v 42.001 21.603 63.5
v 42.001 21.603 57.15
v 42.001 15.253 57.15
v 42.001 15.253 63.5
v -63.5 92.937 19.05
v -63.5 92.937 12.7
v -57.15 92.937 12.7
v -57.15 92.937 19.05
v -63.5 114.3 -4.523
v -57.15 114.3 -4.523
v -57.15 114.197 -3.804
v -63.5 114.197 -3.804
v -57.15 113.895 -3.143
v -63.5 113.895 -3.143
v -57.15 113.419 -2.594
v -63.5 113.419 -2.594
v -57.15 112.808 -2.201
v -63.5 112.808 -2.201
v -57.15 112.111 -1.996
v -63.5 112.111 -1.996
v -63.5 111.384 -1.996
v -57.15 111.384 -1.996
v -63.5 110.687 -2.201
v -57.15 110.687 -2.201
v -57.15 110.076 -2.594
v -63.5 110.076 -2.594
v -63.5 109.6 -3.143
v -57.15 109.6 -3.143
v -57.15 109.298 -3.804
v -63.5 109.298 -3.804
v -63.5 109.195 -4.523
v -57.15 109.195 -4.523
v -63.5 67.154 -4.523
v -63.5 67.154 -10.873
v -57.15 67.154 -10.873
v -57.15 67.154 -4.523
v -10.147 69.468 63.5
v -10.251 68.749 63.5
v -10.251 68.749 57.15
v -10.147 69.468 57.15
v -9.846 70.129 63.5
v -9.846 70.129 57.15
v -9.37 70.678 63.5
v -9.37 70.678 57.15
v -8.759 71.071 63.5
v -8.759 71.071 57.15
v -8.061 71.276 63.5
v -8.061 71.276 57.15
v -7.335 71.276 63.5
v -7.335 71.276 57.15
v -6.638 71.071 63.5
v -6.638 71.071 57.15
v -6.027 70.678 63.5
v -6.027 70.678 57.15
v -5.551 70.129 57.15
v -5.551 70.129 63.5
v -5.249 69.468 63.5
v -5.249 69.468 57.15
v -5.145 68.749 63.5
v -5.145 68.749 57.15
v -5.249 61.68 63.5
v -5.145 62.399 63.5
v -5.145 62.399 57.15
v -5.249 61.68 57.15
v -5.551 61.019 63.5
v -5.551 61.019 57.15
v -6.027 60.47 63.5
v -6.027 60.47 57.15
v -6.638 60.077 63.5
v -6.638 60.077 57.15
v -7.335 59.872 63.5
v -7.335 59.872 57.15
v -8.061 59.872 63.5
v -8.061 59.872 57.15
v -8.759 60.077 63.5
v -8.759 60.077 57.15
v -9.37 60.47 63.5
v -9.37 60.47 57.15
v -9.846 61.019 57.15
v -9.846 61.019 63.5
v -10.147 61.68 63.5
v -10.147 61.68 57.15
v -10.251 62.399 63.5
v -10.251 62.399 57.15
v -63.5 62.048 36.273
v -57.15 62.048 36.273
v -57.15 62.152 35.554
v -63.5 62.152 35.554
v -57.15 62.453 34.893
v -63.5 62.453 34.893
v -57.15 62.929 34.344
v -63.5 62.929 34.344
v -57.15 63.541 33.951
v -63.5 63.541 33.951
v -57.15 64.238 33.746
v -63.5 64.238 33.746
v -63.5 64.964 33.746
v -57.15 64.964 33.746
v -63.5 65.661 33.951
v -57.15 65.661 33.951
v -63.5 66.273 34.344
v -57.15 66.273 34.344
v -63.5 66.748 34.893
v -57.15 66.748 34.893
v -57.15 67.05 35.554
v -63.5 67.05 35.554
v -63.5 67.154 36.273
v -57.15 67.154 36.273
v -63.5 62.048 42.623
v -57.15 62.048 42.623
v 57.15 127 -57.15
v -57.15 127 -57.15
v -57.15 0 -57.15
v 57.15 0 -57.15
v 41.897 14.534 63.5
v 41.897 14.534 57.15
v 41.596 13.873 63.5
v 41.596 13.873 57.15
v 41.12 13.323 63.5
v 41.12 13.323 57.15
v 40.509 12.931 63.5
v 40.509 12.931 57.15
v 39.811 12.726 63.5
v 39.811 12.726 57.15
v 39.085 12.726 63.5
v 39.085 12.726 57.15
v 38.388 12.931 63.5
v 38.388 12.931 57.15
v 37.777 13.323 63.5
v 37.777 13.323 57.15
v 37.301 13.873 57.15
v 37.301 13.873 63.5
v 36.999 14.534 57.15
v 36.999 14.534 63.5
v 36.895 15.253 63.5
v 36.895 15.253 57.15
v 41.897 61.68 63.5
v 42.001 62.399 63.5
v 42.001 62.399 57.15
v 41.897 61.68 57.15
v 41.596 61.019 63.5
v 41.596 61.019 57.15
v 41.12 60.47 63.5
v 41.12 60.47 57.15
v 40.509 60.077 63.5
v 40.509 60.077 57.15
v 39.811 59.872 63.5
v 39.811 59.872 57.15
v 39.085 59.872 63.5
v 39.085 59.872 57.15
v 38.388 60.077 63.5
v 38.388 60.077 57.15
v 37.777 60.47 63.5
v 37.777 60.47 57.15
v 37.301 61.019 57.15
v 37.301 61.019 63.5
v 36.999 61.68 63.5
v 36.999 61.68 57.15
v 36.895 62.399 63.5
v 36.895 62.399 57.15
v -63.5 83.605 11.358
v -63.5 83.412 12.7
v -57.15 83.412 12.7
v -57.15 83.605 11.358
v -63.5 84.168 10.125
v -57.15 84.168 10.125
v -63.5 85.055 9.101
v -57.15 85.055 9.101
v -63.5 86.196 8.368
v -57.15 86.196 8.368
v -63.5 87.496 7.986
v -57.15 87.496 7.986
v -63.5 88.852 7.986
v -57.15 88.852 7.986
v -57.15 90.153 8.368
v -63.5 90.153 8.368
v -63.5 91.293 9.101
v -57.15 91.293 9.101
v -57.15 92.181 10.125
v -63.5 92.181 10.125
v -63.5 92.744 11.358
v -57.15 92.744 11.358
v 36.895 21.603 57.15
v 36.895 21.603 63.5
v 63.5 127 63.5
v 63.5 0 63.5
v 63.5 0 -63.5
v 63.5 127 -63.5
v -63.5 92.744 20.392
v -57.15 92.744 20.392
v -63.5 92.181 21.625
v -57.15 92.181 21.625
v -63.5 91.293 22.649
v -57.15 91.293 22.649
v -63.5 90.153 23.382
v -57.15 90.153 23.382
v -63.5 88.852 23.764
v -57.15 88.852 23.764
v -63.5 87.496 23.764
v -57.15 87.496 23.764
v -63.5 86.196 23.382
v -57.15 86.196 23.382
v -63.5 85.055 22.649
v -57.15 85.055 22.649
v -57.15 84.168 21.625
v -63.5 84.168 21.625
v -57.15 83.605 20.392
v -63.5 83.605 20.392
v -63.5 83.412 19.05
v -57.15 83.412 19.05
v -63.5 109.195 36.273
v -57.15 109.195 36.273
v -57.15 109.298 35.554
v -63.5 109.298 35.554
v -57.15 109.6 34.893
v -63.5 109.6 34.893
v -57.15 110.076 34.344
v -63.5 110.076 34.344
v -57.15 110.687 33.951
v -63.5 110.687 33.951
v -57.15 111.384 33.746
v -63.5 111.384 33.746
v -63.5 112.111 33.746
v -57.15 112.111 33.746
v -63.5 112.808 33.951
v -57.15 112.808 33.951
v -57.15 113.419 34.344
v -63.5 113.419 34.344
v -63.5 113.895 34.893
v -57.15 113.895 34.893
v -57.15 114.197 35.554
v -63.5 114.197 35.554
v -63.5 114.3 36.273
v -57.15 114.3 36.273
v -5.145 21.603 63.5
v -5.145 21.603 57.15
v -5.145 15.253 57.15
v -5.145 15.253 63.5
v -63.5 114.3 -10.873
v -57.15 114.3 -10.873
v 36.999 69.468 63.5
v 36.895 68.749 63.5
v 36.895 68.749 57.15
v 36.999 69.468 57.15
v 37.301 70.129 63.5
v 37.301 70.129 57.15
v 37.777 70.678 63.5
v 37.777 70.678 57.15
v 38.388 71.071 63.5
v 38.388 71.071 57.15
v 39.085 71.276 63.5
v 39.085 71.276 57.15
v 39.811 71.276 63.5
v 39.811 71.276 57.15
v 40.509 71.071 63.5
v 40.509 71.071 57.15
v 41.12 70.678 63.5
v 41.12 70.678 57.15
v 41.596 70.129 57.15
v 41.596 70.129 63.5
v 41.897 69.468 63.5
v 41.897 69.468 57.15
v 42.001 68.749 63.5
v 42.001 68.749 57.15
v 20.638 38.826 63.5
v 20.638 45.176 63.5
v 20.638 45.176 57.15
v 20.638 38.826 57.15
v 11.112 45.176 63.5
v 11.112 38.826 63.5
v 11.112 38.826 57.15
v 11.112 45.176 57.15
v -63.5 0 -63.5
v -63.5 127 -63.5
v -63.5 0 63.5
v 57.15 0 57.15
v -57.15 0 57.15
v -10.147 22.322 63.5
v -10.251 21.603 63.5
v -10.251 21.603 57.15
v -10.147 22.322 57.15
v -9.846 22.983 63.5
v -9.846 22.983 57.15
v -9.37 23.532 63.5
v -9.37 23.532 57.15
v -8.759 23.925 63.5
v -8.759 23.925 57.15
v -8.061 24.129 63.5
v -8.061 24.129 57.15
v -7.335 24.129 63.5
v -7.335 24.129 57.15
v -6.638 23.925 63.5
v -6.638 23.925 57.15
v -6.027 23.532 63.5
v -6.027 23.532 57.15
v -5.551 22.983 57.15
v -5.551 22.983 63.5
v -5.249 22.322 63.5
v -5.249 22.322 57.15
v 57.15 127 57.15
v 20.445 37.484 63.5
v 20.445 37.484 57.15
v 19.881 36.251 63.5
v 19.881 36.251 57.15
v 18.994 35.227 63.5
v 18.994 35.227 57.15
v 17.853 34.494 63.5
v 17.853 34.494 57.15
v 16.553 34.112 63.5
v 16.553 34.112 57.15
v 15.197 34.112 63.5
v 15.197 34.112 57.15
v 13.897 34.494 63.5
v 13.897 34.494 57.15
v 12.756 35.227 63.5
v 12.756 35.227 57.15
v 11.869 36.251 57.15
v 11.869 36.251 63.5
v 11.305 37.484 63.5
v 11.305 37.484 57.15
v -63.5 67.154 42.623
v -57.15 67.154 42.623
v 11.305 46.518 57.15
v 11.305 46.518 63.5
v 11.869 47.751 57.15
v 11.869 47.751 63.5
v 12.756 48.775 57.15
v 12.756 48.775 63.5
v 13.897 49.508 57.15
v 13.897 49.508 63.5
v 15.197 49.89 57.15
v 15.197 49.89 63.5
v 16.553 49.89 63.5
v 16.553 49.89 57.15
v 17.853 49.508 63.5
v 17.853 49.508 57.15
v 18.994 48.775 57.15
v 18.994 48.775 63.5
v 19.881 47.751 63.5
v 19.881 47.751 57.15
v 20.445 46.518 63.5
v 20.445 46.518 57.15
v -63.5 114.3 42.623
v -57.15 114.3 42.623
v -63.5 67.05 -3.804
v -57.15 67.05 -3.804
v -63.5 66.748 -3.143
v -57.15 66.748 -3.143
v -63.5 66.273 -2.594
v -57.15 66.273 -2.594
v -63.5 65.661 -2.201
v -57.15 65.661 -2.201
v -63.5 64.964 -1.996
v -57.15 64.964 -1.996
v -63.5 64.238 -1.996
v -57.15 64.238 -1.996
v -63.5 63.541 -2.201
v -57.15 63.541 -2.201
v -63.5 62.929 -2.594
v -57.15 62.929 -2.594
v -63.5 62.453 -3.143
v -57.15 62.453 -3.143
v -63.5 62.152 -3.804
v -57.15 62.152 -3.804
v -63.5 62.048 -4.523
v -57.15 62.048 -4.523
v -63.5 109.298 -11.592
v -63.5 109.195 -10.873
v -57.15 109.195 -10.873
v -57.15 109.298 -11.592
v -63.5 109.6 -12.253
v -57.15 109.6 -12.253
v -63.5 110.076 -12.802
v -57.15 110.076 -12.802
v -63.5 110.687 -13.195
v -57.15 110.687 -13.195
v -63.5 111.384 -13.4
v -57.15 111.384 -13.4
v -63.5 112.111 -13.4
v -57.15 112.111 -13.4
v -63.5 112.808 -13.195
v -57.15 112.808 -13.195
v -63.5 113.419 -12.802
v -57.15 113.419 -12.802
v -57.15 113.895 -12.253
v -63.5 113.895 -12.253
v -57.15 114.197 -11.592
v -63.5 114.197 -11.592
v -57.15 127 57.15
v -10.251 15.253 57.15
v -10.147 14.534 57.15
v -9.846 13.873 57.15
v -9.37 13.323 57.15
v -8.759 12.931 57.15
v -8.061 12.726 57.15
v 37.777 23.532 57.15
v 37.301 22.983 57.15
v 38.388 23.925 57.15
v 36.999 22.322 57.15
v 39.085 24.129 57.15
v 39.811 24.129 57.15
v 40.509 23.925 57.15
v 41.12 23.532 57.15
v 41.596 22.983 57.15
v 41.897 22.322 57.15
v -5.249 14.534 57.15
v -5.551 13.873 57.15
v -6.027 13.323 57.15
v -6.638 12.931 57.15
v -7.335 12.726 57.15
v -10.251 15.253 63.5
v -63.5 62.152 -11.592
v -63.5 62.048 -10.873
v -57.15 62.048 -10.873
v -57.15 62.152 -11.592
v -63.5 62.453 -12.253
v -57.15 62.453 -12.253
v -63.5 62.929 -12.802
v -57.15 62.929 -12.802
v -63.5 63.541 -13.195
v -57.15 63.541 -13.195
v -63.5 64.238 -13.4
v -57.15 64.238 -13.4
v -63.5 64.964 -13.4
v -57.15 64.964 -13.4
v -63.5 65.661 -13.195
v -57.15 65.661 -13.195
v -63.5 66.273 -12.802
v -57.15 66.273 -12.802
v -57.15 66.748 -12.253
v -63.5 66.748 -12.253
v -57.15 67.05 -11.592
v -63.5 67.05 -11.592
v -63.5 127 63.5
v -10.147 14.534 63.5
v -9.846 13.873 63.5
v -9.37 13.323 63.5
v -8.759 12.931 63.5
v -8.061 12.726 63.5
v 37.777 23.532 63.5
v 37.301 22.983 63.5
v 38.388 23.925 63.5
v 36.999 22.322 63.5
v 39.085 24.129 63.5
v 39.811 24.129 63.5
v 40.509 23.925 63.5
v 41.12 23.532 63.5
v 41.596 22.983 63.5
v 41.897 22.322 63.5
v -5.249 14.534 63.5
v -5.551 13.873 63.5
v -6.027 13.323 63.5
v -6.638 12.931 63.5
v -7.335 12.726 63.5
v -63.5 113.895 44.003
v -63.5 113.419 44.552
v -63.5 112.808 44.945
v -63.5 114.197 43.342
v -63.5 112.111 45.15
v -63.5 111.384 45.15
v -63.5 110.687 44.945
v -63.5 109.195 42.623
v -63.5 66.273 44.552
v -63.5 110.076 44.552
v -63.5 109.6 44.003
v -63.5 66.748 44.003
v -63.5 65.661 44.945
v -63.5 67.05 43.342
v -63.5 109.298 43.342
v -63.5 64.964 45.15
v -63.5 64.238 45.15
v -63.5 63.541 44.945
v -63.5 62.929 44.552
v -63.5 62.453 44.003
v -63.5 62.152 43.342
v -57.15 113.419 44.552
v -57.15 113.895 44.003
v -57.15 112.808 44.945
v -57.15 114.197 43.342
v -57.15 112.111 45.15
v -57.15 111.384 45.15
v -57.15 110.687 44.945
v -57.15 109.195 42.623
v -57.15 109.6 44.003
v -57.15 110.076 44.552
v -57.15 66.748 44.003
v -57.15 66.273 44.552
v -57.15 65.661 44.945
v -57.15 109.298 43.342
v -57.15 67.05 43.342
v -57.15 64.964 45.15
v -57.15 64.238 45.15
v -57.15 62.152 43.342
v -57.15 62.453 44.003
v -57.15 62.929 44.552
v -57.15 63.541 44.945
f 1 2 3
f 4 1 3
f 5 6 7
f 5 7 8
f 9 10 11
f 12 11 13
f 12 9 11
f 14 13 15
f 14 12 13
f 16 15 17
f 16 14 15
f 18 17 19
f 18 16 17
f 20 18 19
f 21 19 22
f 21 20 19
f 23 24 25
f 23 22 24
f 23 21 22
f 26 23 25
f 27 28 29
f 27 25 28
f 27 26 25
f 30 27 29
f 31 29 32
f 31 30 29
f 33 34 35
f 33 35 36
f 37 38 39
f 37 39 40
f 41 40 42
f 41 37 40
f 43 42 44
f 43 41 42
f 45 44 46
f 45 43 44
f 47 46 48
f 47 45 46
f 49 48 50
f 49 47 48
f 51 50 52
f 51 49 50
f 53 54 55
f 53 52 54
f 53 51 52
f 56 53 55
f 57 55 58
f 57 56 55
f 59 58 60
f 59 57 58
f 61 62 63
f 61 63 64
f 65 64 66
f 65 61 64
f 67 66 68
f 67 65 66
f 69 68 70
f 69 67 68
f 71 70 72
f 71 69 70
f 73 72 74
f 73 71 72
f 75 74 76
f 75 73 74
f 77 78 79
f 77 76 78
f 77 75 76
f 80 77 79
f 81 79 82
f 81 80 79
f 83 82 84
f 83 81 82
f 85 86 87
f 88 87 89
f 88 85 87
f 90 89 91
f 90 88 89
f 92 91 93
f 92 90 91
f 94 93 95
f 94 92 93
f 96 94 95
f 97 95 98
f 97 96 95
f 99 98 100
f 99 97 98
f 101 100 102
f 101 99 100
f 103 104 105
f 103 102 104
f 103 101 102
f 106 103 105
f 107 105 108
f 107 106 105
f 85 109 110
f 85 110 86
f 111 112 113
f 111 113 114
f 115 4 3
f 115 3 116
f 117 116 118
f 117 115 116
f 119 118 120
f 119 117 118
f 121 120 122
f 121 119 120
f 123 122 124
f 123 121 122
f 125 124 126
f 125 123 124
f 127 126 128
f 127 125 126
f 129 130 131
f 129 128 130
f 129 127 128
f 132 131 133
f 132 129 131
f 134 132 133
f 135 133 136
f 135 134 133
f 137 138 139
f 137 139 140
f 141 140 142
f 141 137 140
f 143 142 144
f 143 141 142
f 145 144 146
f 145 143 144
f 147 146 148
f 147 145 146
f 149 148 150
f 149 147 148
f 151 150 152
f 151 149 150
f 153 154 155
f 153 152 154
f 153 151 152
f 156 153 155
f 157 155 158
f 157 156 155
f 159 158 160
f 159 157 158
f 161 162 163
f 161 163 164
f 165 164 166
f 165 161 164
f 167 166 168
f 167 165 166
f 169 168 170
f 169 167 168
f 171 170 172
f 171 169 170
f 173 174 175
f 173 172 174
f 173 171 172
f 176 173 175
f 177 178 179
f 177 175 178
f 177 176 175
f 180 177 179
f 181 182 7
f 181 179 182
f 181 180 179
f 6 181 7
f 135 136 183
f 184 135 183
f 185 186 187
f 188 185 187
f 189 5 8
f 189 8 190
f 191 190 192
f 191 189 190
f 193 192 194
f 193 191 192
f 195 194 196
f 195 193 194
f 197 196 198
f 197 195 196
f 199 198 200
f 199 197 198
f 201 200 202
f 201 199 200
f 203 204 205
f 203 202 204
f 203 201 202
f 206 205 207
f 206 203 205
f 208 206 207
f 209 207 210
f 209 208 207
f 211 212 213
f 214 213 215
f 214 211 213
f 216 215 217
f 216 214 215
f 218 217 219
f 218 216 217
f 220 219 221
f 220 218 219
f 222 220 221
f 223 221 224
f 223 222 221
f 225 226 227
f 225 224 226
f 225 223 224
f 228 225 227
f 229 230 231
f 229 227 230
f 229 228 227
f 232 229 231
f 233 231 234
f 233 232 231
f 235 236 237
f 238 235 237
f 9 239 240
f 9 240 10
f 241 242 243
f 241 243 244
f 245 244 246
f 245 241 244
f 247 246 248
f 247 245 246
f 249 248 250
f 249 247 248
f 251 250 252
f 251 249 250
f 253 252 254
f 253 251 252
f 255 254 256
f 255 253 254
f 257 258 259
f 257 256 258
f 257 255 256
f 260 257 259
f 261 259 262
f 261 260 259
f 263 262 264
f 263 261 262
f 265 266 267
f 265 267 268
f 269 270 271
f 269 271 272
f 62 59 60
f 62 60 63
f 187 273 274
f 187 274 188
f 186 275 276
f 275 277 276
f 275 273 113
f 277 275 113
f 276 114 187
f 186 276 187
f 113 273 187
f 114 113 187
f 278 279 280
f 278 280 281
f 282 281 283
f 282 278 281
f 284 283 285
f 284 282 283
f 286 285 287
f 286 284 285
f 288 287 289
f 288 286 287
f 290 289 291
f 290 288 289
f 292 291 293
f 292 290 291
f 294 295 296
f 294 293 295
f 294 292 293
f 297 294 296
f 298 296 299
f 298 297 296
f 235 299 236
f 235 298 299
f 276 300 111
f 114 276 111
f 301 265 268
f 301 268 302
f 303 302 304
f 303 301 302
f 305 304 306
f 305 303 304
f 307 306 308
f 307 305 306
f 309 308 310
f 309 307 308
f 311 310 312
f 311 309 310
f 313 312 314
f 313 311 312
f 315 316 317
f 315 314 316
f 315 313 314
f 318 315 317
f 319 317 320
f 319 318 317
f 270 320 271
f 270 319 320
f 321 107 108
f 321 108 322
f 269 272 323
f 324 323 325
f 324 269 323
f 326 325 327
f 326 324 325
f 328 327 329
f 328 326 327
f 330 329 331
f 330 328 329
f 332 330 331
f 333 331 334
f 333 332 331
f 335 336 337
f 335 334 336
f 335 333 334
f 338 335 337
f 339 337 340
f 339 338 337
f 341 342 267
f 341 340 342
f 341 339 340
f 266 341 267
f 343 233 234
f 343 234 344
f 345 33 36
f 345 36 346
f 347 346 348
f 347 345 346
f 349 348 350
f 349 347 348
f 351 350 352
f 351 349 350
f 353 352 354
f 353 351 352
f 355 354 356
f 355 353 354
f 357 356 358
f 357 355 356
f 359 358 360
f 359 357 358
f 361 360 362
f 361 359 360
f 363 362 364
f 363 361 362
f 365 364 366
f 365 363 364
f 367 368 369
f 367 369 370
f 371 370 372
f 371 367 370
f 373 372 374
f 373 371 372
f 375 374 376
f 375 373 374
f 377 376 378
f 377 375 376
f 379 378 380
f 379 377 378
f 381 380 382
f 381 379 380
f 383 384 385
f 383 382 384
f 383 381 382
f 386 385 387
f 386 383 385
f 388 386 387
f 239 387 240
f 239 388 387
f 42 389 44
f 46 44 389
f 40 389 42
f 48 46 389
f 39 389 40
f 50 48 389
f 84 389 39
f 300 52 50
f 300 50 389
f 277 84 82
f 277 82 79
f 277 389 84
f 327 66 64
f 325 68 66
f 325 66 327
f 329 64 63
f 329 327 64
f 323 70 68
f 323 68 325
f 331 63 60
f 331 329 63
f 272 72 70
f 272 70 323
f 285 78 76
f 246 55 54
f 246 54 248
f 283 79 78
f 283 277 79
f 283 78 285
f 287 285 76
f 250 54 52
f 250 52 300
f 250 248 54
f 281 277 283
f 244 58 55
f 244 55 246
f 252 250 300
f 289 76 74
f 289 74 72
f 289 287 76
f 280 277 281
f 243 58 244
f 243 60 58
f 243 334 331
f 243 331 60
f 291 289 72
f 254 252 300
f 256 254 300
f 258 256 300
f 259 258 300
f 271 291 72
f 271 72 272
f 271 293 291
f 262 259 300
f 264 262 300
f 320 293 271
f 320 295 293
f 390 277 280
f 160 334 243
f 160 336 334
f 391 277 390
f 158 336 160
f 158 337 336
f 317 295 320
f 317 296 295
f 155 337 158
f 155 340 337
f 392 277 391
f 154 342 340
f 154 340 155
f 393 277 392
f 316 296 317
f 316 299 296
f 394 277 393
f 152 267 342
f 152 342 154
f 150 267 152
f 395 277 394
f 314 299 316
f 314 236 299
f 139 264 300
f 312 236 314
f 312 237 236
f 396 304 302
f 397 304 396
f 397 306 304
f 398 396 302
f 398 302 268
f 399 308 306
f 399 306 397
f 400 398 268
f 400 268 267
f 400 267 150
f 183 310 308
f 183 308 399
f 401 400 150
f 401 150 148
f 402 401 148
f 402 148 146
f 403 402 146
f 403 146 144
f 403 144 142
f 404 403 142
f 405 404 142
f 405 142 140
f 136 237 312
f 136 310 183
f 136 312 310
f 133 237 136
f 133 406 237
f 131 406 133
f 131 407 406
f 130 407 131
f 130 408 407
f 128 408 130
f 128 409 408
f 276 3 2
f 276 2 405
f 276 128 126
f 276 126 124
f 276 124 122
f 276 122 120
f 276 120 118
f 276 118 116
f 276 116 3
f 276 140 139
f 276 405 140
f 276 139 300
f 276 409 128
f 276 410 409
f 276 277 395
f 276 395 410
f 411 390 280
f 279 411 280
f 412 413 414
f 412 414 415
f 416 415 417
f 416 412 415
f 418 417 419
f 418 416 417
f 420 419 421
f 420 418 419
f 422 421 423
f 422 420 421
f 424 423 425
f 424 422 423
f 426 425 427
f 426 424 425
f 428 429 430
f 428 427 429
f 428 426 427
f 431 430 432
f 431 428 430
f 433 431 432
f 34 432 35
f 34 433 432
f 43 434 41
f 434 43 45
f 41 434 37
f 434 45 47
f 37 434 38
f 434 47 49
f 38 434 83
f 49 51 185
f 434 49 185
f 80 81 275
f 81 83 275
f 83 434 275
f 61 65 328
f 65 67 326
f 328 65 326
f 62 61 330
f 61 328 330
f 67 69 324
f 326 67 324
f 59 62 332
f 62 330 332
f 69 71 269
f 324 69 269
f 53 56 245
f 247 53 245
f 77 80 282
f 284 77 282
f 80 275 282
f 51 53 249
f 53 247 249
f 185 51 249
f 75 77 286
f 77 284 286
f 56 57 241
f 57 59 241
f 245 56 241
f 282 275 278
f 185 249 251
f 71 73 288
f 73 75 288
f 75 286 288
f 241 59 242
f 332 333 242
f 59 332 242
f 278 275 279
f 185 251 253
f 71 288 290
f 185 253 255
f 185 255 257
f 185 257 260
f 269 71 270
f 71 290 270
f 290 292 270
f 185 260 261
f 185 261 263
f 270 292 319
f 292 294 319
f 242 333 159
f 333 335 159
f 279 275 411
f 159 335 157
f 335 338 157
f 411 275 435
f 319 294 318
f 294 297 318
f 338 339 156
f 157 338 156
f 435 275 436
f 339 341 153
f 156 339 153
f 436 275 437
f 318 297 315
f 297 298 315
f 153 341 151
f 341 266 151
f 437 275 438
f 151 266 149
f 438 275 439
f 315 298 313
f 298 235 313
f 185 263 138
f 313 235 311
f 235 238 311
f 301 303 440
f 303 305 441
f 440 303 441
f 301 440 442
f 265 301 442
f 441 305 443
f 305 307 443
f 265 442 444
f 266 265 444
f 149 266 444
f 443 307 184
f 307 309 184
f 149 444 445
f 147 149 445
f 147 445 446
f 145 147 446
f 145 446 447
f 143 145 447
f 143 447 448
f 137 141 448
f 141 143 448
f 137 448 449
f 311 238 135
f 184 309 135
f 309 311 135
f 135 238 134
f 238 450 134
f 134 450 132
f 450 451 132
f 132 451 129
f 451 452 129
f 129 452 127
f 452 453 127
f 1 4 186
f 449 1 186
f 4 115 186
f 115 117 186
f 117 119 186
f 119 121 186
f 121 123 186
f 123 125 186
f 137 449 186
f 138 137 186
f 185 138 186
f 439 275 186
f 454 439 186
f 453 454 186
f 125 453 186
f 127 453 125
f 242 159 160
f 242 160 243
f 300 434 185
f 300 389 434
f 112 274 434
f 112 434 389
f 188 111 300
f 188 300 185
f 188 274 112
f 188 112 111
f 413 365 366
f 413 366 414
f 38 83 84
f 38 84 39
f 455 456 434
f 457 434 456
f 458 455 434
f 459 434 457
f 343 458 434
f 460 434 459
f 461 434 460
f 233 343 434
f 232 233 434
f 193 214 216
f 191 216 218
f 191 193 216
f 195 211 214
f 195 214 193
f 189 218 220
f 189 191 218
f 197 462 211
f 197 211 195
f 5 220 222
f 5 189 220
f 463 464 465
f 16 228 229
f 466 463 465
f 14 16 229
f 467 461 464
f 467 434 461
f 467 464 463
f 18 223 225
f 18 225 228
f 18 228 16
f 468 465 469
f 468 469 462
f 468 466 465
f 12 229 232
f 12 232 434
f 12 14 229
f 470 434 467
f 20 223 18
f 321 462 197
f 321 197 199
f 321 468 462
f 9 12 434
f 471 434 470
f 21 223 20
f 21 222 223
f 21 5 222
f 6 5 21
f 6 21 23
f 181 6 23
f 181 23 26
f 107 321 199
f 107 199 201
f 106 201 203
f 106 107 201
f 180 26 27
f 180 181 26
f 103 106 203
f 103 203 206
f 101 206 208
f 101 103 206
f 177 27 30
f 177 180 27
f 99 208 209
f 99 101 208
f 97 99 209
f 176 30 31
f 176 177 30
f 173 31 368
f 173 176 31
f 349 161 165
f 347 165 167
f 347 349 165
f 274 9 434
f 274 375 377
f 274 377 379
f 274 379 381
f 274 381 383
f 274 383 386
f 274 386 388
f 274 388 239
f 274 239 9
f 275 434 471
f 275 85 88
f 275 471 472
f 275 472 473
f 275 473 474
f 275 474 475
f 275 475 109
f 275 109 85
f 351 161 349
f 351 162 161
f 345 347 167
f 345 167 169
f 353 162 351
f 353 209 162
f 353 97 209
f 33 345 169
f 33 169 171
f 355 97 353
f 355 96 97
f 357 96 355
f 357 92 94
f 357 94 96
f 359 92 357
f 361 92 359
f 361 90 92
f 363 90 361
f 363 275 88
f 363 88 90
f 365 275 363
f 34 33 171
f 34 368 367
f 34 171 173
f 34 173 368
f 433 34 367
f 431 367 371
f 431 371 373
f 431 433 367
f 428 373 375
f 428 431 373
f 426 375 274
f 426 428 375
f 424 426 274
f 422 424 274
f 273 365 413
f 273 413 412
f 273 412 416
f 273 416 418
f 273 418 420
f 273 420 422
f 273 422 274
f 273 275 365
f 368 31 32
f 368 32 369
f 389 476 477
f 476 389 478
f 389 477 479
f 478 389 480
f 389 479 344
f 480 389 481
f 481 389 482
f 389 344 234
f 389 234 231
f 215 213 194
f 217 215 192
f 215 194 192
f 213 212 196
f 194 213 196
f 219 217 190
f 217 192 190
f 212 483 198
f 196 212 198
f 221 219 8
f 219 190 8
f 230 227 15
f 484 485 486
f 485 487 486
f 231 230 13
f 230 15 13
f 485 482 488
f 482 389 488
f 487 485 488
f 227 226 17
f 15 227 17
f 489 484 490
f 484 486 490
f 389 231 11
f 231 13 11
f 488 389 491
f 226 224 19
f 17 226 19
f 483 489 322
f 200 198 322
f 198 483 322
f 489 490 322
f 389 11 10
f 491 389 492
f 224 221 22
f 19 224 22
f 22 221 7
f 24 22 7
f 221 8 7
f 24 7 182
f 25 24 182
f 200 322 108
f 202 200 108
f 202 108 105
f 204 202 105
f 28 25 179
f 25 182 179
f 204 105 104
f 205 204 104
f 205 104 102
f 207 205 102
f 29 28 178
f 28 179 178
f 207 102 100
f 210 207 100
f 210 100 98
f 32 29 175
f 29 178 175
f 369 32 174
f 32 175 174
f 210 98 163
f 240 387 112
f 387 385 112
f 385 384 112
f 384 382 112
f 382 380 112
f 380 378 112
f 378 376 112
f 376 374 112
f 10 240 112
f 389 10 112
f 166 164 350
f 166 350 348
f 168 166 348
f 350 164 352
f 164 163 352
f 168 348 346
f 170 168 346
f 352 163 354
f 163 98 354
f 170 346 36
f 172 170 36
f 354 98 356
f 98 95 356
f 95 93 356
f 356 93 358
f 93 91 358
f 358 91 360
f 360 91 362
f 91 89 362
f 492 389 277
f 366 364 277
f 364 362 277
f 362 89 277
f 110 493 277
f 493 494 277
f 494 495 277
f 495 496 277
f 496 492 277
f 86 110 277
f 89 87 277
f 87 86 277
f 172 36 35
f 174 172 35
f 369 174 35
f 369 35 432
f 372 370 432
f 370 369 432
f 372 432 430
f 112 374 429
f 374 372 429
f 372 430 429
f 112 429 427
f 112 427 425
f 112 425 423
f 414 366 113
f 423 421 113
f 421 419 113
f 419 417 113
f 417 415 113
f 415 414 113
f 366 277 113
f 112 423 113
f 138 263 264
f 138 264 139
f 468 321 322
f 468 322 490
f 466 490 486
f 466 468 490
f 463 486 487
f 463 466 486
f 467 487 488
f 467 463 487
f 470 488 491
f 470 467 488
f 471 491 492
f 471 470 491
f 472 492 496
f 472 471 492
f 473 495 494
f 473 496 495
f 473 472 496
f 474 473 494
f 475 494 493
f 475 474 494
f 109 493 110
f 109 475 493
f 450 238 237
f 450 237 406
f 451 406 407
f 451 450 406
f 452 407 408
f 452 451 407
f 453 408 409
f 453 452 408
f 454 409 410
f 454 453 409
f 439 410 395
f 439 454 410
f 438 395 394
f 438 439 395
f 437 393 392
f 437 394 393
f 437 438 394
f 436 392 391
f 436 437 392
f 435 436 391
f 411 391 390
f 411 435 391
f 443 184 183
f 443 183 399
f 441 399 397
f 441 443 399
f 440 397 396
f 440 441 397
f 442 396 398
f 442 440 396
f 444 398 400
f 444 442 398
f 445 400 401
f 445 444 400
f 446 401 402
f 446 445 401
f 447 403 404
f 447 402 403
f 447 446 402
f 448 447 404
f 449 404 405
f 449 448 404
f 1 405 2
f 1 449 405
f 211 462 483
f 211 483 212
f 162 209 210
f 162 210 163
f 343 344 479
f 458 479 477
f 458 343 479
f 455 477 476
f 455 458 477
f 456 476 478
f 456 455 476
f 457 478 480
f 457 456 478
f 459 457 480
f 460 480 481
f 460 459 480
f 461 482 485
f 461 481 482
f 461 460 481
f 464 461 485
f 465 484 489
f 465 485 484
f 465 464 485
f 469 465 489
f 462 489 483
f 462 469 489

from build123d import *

# Parameters (mm, degrees)
SKETCH2_W           = 127
SKETCH2_H           = 127
SKETCH2_W_2         = 114.3
SKETCH2_H_2         = 114.3
BOSS_EXTRUDE2_DEPTH = 127
CUT_EXTRUDE1_REACH  = 129
CUT_EXTRUDE2_REACH  = 129


with BuildPart() as part:
    # Sketch2 → Boss-Extrude2 (new body)
    with BuildSketch(Plane(origin=(0, 0, 0), x_dir=(1, 0, 0), z_dir=(0, 1, 0))):
        Rectangle(SKETCH2_W, SKETCH2_H)
        Rectangle(SKETCH2_W_2, SKETCH2_H_2, mode=Mode.SUBTRACT)
    extrude(amount=BOSS_EXTRUDE2_DEPTH)

    # Sketch6 → Cut-Extrude1 (cut, up to next)
    with BuildSketch(Plane.ZY.offset(63.5), mode=Mode.PRIVATE) as cut_extrude1_sk1:
        with BuildLine():
            Line((-4.523172318, 109.1946), (-10.873172318, 109.1946))
            ThreePointArc((-10.873172318, 109.1946), (-13.425872318, 111.7473), (-10.873172318, 114.3))
            Line((-10.873172318, 114.3), (-4.523172318, 114.3))
            ThreePointArc((-4.523172318, 114.3), (-1.970472318, 111.7473), (-4.523172318, 109.1946))
        make_face()
    cut_extrude1_tool1 = extrude(cut_extrude1_sk1.sketch, amount=-CUT_EXTRUDE1_REACH, mode=Mode.PRIVATE) & part.part
    add(cut_extrude1_tool1.solids().sort_by_distance((-63.5, 111.7473, -7.698172))[0], mode=Mode.SUBTRACT)
    # Sketch6 → Cut-Extrude1 (cut, up to next)
    with BuildSketch(Plane.ZY.offset(63.5), mode=Mode.PRIVATE) as cut_extrude1_sk2:
        with BuildLine():
            Line((36.273172318, 114.3), (42.623172318, 114.3))
            ThreePointArc((42.623172318, 114.3), (45.175872318, 111.7473), (42.623172318, 109.1946))
            Line((42.623172318, 109.1946), (36.273172318, 109.1946))
            ThreePointArc((36.273172318, 109.1946), (33.720472318, 111.7473), (36.273172318, 114.3))
        make_face()
    cut_extrude1_tool2 = extrude(cut_extrude1_sk2.sketch, amount=-CUT_EXTRUDE1_REACH, mode=Mode.PRIVATE) & part.part
    add(cut_extrude1_tool2.solids().sort_by_distance((-63.5, 111.7473, 39.448172))[0], mode=Mode.SUBTRACT)
    # Sketch6 → Cut-Extrude1 (cut, up to next)
    with BuildSketch(Plane.ZY.offset(63.5), mode=Mode.PRIVATE) as cut_extrude1_sk3:
        with BuildLine():
            Line((36.273172318, 67.153655364), (42.623172318, 67.153655364))
            ThreePointArc((42.623172318, 67.153655364), (45.175872318, 64.600955364), (42.623172318, 62.048255364))
            Line((42.623172318, 62.048255364), (36.273172318, 62.048255364))
            ThreePointArc((36.273172318, 62.048255364), (33.720472318, 64.600955364), (36.273172318, 67.153655364))
        make_face()
    cut_extrude1_tool3 = extrude(cut_extrude1_sk3.sketch, amount=-CUT_EXTRUDE1_REACH, mode=Mode.PRIVATE) & part.part
    add(cut_extrude1_tool3.solids().sort_by_distance((-63.5, 64.600955, 39.448172))[0], mode=Mode.SUBTRACT)
    # Sketch6 → Cut-Extrude1 (cut, up to next)
    with BuildSketch(Plane.ZY.offset(63.5), mode=Mode.PRIVATE) as cut_extrude1_sk4:
        with BuildLine():
            Line((-4.523172318, 62.048255364), (-10.873172318, 62.048255364))
            ThreePointArc((-10.873172318, 62.048255364), (-13.425872318, 64.600955364), (-10.873172318, 67.153655364))
            Line((-10.873172318, 67.153655364), (-4.523172318, 67.153655364))
            ThreePointArc((-4.523172318, 67.153655364), (-1.970472318, 64.600955364), (-4.523172318, 62.048255364))
        make_face()
    cut_extrude1_tool4 = extrude(cut_extrude1_sk4.sketch, amount=-CUT_EXTRUDE1_REACH, mode=Mode.PRIVATE) & part.part
    add(cut_extrude1_tool4.solids().sort_by_distance((-63.5, 64.600955, -7.698172))[0], mode=Mode.SUBTRACT)
    # Sketch6 → Cut-Extrude1 (cut, up to next)
    with BuildSketch(Plane.ZY.offset(63.5), mode=Mode.PRIVATE) as cut_extrude1_sk5:
        with BuildLine():
            Line((19.05, 83.411627682), (12.7, 83.411627682))
            ThreePointArc((12.7, 83.411627682), (7.9375, 88.174127682), (12.7, 92.936627682))
            Line((12.7, 92.936627682), (19.05, 92.936627682))
            ThreePointArc((19.05, 92.936627682), (23.8125, 88.174127682), (19.05, 83.411627682))
        make_face()
    cut_extrude1_tool5 = extrude(cut_extrude1_sk5.sketch, amount=-CUT_EXTRUDE1_REACH, mode=Mode.PRIVATE) & part.part
    add(cut_extrude1_tool5.solids().sort_by_distance((-63.5, 88.174128, 15.875))[0], mode=Mode.SUBTRACT)

    # Sketch8 → Cut-Extrude2 (cut, up to next)
    with BuildSketch(Plane.XY.offset(63.5), mode=Mode.PRIVATE) as cut_extrude2_sk1:
        with BuildLine():
            Line((-10.250872318, 62.399044636), (-10.250872318, 68.749044636))
            ThreePointArc((-10.250872318, 68.749044636), (-7.698172318, 71.301744636), (-5.145472318, 68.749044636))
            Line((-5.145472318, 68.749044636), (-5.145472318, 62.399044636))
            ThreePointArc((-5.145472318, 62.399044636), (-7.698172318, 59.846344636), (-10.250872318, 62.399044636))
        make_face()
    cut_extrude2_tool1 = extrude(cut_extrude2_sk1.sketch, amount=-CUT_EXTRUDE2_REACH, mode=Mode.PRIVATE) & part.part
    add(cut_extrude2_tool1.solids().sort_by_distance((-7.698172, 65.574045, 63.5))[0], mode=Mode.SUBTRACT)
    # Sketch8 → Cut-Extrude2 (cut, up to next)
    with BuildSketch(Plane.XY.offset(63.5), mode=Mode.PRIVATE) as cut_extrude2_sk2:
        with BuildLine():
            Line((36.895472318, 62.399044636), (36.895472318, 68.749044636))
            ThreePointArc((36.895472318, 68.749044636), (39.448172318, 71.301744636), (42.000872318, 68.749044636))
            Line((42.000872318, 68.749044636), (42.000872318, 62.399044636))
            ThreePointArc((42.000872318, 62.399044636), (39.448172318, 59.846344636), (36.895472318, 62.399044636))
        make_face()
    cut_extrude2_tool2 = extrude(cut_extrude2_sk2.sketch, amount=-CUT_EXTRUDE2_REACH, mode=Mode.PRIVATE) & part.part
    add(cut_extrude2_tool2.solids().sort_by_distance((39.448172, 65.574045, 63.5))[0], mode=Mode.SUBTRACT)
    # Sketch8 → Cut-Extrude2 (cut, up to next)
    with BuildSketch(Plane.XY.offset(63.5), mode=Mode.PRIVATE) as cut_extrude2_sk3:
        with BuildLine():
            Line((42.000872318, 21.6027), (42.000872318, 15.2527))
            ThreePointArc((42.000872318, 15.2527), (39.448172318, 12.7), (36.895472318, 15.2527))
            Line((36.895472318, 15.2527), (36.895472318, 21.6027))
            ThreePointArc((36.895472318, 21.6027), (39.448172318, 24.1554), (42.000872318, 21.6027))
        make_face()
    cut_extrude2_tool3 = extrude(cut_extrude2_sk3.sketch, amount=-CUT_EXTRUDE2_REACH, mode=Mode.PRIVATE) & part.part
    add(cut_extrude2_tool3.solids().sort_by_distance((39.448172, 18.4277, 63.5))[0], mode=Mode.SUBTRACT)
    # Sketch8 → Cut-Extrude2 (cut, up to next)
    with BuildSketch(Plane.XY.offset(63.5), mode=Mode.PRIVATE) as cut_extrude2_sk4:
        with BuildLine():
            Line((-10.250872318, 15.2527), (-10.250872318, 21.6027))
            ThreePointArc((-10.250872318, 21.6027), (-7.698172318, 24.1554), (-5.145472318, 21.6027))
            Line((-5.145472318, 21.6027), (-5.145472318, 15.2527))
            ThreePointArc((-5.145472318, 15.2527), (-7.698172318, 12.7), (-10.250872318, 15.2527))
        make_face()
    cut_extrude2_tool4 = extrude(cut_extrude2_sk4.sketch, amount=-CUT_EXTRUDE2_REACH, mode=Mode.PRIVATE) & part.part
    add(cut_extrude2_tool4.solids().sort_by_distance((-7.698172, 18.4277, 63.5))[0], mode=Mode.SUBTRACT)
    # Sketch8 → Cut-Extrude2 (cut, up to next)
    with BuildSketch(Plane.XY.offset(63.5), mode=Mode.PRIVATE) as cut_extrude2_sk5:
        with BuildLine():
            Line((11.1125, 38.825872318), (11.1125, 45.175872318))
            ThreePointArc((11.1125, 45.175872318), (15.875, 49.938372318), (20.6375, 45.175872318))
            Line((20.6375, 45.175872318), (20.6375, 38.825872318))
            ThreePointArc((20.6375, 38.825872318), (15.875, 34.063372318), (11.1125, 38.825872318))
        make_face()
    cut_extrude2_tool5 = extrude(cut_extrude2_sk5.sketch, amount=-CUT_EXTRUDE2_REACH, mode=Mode.PRIVATE) & part.part
    add(cut_extrude2_tool5.solids().sort_by_distance((15.875, 42.000872, 63.5))[0], mode=Mode.SUBTRACT)


solid = part.part
